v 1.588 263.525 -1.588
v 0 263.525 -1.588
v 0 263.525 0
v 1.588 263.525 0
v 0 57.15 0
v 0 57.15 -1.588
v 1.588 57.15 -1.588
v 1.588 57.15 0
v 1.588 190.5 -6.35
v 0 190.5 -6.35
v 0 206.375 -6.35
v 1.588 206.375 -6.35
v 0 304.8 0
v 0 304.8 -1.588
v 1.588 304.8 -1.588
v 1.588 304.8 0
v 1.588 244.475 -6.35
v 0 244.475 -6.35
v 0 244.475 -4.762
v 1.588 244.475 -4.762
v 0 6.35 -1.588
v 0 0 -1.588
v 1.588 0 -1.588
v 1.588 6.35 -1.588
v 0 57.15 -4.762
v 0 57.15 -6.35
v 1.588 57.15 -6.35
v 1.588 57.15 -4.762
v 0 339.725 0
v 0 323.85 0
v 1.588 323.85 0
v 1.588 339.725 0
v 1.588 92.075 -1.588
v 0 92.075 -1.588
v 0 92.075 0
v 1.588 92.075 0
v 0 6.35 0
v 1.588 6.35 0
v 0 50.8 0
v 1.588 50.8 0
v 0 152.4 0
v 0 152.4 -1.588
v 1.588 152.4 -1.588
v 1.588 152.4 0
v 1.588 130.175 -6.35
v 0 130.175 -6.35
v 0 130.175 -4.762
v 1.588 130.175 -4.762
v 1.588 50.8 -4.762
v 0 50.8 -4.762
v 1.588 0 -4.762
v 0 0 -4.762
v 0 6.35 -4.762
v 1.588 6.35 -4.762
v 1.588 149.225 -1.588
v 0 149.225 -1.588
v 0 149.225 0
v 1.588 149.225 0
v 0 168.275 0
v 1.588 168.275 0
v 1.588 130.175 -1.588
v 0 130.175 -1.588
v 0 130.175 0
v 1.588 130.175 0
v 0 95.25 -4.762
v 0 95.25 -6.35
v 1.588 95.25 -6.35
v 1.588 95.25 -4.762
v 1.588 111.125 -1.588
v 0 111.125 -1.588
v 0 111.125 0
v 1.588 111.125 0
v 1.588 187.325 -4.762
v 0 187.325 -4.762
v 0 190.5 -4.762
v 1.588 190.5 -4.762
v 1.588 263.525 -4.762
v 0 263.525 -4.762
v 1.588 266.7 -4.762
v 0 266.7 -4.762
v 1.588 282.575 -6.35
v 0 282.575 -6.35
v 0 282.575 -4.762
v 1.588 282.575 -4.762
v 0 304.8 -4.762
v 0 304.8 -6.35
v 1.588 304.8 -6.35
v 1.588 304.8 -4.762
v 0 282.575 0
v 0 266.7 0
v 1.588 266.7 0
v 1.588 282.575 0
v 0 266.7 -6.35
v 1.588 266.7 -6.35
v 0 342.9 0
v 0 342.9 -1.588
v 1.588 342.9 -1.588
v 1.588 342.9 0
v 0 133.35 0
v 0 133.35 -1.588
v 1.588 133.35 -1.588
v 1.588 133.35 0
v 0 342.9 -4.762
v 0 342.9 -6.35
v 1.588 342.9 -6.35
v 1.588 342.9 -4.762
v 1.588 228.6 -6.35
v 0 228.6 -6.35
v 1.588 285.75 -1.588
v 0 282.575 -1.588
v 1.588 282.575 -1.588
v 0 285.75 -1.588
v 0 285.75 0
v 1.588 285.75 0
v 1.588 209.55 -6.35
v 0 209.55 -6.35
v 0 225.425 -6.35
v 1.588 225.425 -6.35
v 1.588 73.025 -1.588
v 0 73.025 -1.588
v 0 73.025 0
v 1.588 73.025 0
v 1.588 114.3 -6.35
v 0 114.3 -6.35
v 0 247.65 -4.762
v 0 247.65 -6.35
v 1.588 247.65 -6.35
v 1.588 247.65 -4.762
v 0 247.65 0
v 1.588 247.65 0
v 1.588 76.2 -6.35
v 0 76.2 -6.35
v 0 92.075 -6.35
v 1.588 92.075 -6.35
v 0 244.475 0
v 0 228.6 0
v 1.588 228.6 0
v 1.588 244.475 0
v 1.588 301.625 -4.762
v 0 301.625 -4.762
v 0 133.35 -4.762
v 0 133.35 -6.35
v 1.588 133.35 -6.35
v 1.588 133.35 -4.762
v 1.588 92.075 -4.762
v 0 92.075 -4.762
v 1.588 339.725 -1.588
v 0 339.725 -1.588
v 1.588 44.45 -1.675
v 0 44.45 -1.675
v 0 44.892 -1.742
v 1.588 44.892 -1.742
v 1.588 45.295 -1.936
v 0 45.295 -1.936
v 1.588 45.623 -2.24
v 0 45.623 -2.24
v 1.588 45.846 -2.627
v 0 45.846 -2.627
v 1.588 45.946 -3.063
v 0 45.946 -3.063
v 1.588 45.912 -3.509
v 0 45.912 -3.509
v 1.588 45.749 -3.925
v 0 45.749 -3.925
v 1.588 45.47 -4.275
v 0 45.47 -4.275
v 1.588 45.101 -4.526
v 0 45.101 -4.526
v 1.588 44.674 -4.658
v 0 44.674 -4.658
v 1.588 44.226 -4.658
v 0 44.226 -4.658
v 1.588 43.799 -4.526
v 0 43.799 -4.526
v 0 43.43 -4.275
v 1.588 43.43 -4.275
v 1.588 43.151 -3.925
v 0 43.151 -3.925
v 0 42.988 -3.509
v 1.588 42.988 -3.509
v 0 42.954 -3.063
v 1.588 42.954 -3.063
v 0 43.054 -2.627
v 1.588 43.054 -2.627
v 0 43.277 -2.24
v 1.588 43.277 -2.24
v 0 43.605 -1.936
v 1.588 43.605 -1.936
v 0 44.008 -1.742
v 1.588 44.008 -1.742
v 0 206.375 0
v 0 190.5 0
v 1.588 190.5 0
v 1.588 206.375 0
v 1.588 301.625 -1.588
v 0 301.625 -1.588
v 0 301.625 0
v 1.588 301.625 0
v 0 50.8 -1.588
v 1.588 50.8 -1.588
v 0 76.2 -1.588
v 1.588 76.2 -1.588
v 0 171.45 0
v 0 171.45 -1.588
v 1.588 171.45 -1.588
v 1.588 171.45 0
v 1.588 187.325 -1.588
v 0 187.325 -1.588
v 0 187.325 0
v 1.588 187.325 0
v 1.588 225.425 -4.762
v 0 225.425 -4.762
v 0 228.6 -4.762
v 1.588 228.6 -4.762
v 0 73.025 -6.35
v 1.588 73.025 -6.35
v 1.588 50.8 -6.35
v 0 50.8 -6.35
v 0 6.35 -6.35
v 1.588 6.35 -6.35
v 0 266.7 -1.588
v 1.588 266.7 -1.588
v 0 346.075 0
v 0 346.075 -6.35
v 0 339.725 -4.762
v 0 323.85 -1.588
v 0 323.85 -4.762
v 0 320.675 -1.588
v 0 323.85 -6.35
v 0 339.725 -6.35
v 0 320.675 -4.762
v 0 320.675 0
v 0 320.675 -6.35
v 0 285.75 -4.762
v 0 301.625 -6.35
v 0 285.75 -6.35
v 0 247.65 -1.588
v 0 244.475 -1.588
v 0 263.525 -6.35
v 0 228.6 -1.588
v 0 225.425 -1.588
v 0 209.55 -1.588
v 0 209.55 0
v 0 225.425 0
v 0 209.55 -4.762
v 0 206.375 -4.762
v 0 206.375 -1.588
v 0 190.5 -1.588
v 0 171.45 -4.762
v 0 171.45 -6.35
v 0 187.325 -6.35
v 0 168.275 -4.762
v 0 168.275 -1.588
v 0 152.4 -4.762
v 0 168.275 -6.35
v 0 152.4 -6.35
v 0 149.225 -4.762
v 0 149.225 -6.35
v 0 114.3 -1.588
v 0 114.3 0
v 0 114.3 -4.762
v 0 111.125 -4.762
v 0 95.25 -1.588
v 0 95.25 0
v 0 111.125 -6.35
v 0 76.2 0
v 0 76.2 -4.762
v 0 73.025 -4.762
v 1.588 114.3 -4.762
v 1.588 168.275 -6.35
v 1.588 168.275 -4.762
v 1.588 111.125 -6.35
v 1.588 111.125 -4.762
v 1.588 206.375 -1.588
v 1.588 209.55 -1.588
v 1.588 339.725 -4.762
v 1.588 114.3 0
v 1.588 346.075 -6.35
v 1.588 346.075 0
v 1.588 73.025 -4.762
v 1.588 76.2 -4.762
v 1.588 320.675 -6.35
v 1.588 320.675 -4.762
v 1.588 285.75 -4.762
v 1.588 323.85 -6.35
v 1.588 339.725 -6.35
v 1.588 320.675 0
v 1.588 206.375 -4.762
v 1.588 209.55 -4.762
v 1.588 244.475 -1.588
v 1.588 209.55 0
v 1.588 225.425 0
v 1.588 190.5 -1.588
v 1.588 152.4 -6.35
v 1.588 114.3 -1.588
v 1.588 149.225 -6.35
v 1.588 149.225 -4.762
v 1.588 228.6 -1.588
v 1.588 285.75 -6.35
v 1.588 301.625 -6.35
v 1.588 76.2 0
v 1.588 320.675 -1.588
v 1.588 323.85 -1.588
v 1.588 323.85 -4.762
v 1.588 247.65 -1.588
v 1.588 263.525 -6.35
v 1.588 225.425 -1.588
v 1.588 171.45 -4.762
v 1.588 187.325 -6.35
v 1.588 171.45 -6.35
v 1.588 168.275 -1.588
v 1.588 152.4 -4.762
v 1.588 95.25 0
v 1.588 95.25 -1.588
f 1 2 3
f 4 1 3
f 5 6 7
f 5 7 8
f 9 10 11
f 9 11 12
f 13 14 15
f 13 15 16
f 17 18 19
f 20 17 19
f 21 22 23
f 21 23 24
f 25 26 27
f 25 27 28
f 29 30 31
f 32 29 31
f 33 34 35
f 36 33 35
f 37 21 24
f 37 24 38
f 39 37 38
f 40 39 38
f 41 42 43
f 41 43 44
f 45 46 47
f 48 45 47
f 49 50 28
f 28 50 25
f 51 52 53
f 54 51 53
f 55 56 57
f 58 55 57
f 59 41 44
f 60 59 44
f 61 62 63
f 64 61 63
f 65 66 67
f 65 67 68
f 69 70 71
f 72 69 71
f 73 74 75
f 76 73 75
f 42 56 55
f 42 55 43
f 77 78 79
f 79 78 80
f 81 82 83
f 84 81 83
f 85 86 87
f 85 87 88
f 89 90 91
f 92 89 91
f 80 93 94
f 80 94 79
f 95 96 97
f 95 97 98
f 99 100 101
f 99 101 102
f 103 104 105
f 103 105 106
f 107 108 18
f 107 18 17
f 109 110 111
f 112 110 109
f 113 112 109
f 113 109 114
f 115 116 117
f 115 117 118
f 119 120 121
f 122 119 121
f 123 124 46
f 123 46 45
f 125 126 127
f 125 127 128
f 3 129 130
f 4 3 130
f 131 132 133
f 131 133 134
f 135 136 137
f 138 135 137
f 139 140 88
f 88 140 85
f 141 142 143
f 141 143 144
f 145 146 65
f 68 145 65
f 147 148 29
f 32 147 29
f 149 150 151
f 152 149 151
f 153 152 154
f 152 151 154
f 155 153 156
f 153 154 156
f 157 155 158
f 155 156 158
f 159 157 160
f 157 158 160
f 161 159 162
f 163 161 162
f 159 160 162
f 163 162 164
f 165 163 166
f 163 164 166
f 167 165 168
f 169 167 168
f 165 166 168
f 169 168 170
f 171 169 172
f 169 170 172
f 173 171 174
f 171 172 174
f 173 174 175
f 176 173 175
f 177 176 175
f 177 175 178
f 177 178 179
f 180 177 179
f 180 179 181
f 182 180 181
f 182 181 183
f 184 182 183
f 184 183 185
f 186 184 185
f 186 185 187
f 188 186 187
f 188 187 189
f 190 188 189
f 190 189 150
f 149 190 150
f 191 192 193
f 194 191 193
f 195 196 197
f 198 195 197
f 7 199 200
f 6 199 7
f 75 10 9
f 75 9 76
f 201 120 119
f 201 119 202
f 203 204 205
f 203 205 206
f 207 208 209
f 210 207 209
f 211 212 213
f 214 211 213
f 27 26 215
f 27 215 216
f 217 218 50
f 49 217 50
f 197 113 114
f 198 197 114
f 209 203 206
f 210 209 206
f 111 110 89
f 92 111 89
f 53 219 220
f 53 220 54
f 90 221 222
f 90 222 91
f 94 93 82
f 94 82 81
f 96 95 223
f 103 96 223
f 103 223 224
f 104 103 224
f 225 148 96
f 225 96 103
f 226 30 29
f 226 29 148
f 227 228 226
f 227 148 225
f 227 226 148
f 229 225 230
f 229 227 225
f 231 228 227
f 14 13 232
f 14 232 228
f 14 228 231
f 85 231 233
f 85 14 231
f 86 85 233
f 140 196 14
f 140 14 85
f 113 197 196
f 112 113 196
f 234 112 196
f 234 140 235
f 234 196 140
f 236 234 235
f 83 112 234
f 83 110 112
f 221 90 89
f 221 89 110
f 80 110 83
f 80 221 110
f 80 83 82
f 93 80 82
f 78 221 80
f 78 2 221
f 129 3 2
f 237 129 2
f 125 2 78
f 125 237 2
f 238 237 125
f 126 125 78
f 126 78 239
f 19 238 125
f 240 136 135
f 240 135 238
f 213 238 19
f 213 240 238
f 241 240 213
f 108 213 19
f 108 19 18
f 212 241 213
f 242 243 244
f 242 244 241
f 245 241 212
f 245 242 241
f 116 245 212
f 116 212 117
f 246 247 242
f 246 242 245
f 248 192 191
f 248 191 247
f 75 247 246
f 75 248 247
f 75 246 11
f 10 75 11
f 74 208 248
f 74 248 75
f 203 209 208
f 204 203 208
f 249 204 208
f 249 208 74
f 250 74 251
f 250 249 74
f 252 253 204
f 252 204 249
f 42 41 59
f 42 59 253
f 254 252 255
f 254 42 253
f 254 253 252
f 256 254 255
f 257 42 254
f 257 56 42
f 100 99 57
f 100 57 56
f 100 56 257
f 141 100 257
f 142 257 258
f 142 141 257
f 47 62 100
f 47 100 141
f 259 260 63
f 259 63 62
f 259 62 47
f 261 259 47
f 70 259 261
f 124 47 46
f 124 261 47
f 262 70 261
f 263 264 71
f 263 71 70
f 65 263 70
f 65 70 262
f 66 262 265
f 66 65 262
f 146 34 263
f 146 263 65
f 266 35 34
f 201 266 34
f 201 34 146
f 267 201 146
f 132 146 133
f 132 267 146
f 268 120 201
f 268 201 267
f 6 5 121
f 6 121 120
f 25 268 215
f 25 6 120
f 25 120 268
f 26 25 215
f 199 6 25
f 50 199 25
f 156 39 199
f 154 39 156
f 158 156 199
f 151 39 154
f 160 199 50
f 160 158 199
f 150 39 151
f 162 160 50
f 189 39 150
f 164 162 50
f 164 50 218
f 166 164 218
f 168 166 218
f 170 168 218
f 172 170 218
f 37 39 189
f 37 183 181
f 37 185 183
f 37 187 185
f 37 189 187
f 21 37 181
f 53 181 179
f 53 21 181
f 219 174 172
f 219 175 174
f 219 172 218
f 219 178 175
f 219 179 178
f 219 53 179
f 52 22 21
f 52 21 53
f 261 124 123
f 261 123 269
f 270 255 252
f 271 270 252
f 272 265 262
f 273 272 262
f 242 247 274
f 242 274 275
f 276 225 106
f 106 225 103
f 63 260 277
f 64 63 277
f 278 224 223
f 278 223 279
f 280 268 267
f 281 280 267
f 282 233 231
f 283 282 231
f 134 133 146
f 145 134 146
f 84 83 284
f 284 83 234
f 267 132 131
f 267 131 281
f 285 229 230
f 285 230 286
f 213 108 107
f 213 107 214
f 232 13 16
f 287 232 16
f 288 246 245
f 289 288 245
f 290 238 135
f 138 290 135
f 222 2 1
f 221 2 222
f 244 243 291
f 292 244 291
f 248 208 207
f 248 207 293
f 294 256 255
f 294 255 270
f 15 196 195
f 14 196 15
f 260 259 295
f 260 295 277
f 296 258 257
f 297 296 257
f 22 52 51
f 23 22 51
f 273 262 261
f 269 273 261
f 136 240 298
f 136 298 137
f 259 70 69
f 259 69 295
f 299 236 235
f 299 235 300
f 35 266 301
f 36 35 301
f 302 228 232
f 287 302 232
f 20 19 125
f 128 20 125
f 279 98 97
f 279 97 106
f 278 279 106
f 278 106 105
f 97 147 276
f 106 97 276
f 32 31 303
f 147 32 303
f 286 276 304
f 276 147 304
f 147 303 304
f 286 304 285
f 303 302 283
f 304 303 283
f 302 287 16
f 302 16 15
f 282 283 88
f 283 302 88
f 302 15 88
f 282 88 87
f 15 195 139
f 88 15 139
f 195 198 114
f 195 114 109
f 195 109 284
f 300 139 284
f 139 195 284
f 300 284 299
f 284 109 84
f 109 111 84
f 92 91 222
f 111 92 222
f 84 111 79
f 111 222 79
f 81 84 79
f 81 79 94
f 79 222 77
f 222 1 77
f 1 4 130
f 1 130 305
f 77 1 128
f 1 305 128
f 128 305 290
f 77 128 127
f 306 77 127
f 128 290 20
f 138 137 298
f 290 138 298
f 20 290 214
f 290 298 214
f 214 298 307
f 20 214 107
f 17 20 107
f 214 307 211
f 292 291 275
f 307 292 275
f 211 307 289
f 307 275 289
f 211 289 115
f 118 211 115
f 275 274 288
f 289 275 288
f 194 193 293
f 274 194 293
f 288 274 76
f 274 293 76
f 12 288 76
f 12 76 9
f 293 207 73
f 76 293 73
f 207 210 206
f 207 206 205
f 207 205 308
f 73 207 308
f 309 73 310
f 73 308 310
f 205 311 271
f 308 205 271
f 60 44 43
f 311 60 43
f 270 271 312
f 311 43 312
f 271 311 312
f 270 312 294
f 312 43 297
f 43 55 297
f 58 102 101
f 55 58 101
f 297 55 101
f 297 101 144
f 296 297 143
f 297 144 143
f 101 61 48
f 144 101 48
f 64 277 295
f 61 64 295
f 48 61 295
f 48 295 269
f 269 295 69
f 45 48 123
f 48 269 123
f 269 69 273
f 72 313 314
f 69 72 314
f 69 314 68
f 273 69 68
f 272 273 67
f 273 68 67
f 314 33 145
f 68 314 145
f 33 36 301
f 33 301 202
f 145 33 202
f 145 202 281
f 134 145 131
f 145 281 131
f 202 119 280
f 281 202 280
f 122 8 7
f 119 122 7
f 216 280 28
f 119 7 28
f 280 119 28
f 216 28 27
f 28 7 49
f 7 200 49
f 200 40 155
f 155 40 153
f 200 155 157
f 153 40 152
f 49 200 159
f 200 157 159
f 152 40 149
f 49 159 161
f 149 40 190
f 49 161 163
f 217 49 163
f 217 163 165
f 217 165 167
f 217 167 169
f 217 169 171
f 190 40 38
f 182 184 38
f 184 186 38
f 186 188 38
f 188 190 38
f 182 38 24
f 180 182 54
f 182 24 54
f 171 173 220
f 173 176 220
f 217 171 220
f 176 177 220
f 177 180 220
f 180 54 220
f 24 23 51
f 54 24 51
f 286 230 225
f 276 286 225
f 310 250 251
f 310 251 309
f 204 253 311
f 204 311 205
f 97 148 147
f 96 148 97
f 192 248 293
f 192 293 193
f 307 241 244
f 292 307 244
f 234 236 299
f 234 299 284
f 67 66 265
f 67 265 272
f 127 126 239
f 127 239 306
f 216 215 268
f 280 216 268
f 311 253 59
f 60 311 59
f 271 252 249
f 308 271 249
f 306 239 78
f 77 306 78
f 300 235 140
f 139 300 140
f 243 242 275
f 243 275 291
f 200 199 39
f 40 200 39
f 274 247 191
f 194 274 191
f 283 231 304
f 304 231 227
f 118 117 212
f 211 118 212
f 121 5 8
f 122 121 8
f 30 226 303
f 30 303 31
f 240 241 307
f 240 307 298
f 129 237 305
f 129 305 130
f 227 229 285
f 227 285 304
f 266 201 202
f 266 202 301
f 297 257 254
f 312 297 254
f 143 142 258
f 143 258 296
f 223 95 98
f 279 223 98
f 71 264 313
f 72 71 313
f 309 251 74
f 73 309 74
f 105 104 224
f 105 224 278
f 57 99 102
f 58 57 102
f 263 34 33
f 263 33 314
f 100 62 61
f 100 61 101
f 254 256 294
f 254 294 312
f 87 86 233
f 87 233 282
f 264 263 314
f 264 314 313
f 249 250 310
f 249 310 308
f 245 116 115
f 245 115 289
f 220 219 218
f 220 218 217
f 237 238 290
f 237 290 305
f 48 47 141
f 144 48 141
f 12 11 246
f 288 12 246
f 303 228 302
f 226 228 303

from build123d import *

# Parameters (mm, degrees)
SKETCH1_W           = 1.5875
SKETCH1_H           = 6.35
BOSS_EXTRUDE1_DEPTH = 346.075
SKETCH2_W           = 1.5875
SKETCH2_H           = 6.35
SKETCH2_H_2         = 3.175
CUT_EXTRUDE1_DEPTH  = 347.136892401
SKETCH3_R           = 1.5
CUT_EXTRUDE2_DEPTH  = 10


with BuildPart() as part:
    # Sketch1 → Boss-Extrude1 (new body)
    with BuildSketch(Plane(origin=(0, 0, 0), x_dir=(1, 0, 0), z_dir=(0, 1, 0))):
        with Locations((0.79375, 3.175)):
            Rectangle(SKETCH1_W, SKETCH1_H)
    extrude(amount=BOSS_EXTRUDE1_DEPTH)

    # Sketch2 → Cut-Extrude1 (cut, through all)
    with BuildSketch(Plane.ZY):
        with Locations((-5.55625, 53.975)):
            Rectangle(SKETCH2_W, SKETCH2_H)
        with Locations((-5.55625, 74.6125)):
            Rectangle(SKETCH2_W, SKETCH2_H_2)
        with Locations((-0.79375, 341.3125)):
            Rectangle(SKETCH2_W, SKETCH2_H_2)
        with Locations((-5.55625, 93.6625)):
            Rectangle(SKETCH2_W, SKETCH2_H_2)
        with Locations((-0.79375, 322.2625)):
            Rectangle(SKETCH2_W, SKETCH2_H_2)
        with Locations((-5.55625, 112.7125)):
            Rectangle(SKETCH2_W, SKETCH2_H_2)
        with Locations((-0.79375, 303.2125)):
            Rectangle(SKETCH2_W, SKETCH2_H_2)
        with Locations((-5.55625, 131.7625)):
            Rectangle(SKETCH2_W, SKETCH2_H_2)
        with Locations((-0.79375, 284.1625)):
            Rectangle(SKETCH2_W, SKETCH2_H_2)
        with Locations((-0.79375, 265.1125)):
            Rectangle(SKETCH2_W, SKETCH2_H_2)
        with Locations((-5.55625, 150.8125)):
            Rectangle(SKETCH2_W, SKETCH2_H_2)
        with Locations((-0.79375, 246.0625)):
            Rectangle(SKETCH2_W, SKETCH2_H_2)
        with Locations((-5.55625, 169.8625)):
            Rectangle(SKETCH2_W, SKETCH2_H_2)
        with Locations((-0.79375, 227.0125)):
            Rectangle(SKETCH2_W, SKETCH2_H_2)
        with Locations((-5.55625, 188.9125)):
            Rectangle(SKETCH2_W, SKETCH2_H_2)
        with Locations((-0.79375, 3.175)):
            Rectangle(SKETCH2_W, SKETCH2_H)
        with Locations((-5.55625, 207.9625)):
            Rectangle(SKETCH2_W, SKETCH2_H_2)
        with Locations((-5.55625, 3.175)):
            Rectangle(SKETCH2_W, SKETCH2_H)
        with Locations((-0.79375, 207.9625)):
            Rectangle(SKETCH2_W, SKETCH2_H_2)
        with Locations((-0.79375, 188.9125)):
            Rectangle(SKETCH2_W, SKETCH2_H_2)
        with Locations((-0.79375, 169.8625)):
            Rectangle(SKETCH2_W, SKETCH2_H_2)
        with Locations((-5.55625, 227.0125)):
            Rectangle(SKETCH2_W, SKETCH2_H_2)
        with Locations((-0.79375, 150.8125)):
            Rectangle(SKETCH2_W, SKETCH2_H_2)
        with Locations((-5.55625, 246.0625)):
            Rectangle(SKETCH2_W, SKETCH2_H_2)
        with Locations((-0.79375, 131.7625)):
            Rectangle(SKETCH2_W, SKETCH2_H_2)
        with Locations((-5.55625, 265.1125)):
            Rectangle(SKETCH2_W, SKETCH2_H_2)
        with Locations((-0.79375, 112.7125)):
            Rectangle(SKETCH2_W, SKETCH2_H_2)
        with Locations((-5.55625, 284.1625)):
            Rectangle(SKETCH2_W, SKETCH2_H_2)
        with Locations((-0.79375, 93.6625)):
            Rectangle(SKETCH2_W, SKETCH2_H_2)
        with Locations((-0.79375, 74.6125)):
            Rectangle(SKETCH2_W, SKETCH2_H_2)
        with Locations((-5.55625, 303.2125)):
            Rectangle(SKETCH2_W, SKETCH2_H_2)
        with Locations((-0.79375, 53.975)):
            Rectangle(SKETCH2_W, SKETCH2_H)
        with Locations((-5.55625, 322.2625)):
            Rectangle(SKETCH2_W, SKETCH2_H_2)
        with Locations((-5.55625, 341.3125)):
            Rectangle(SKETCH2_W, SKETCH2_H_2)
    extrude(amount=-CUT_EXTRUDE1_DEPTH, mode=Mode.SUBTRACT)

    # Sketch3 → Cut-Extrude2 (cut)
    with BuildSketch(Plane.ZY):
        with Locations((-3.175, 44.45)):
            Circle(SKETCH3_R)
    extrude(amount=-CUT_EXTRUDE2_DEPTH, mode=Mode.SUBTRACT)


solid = part.part
